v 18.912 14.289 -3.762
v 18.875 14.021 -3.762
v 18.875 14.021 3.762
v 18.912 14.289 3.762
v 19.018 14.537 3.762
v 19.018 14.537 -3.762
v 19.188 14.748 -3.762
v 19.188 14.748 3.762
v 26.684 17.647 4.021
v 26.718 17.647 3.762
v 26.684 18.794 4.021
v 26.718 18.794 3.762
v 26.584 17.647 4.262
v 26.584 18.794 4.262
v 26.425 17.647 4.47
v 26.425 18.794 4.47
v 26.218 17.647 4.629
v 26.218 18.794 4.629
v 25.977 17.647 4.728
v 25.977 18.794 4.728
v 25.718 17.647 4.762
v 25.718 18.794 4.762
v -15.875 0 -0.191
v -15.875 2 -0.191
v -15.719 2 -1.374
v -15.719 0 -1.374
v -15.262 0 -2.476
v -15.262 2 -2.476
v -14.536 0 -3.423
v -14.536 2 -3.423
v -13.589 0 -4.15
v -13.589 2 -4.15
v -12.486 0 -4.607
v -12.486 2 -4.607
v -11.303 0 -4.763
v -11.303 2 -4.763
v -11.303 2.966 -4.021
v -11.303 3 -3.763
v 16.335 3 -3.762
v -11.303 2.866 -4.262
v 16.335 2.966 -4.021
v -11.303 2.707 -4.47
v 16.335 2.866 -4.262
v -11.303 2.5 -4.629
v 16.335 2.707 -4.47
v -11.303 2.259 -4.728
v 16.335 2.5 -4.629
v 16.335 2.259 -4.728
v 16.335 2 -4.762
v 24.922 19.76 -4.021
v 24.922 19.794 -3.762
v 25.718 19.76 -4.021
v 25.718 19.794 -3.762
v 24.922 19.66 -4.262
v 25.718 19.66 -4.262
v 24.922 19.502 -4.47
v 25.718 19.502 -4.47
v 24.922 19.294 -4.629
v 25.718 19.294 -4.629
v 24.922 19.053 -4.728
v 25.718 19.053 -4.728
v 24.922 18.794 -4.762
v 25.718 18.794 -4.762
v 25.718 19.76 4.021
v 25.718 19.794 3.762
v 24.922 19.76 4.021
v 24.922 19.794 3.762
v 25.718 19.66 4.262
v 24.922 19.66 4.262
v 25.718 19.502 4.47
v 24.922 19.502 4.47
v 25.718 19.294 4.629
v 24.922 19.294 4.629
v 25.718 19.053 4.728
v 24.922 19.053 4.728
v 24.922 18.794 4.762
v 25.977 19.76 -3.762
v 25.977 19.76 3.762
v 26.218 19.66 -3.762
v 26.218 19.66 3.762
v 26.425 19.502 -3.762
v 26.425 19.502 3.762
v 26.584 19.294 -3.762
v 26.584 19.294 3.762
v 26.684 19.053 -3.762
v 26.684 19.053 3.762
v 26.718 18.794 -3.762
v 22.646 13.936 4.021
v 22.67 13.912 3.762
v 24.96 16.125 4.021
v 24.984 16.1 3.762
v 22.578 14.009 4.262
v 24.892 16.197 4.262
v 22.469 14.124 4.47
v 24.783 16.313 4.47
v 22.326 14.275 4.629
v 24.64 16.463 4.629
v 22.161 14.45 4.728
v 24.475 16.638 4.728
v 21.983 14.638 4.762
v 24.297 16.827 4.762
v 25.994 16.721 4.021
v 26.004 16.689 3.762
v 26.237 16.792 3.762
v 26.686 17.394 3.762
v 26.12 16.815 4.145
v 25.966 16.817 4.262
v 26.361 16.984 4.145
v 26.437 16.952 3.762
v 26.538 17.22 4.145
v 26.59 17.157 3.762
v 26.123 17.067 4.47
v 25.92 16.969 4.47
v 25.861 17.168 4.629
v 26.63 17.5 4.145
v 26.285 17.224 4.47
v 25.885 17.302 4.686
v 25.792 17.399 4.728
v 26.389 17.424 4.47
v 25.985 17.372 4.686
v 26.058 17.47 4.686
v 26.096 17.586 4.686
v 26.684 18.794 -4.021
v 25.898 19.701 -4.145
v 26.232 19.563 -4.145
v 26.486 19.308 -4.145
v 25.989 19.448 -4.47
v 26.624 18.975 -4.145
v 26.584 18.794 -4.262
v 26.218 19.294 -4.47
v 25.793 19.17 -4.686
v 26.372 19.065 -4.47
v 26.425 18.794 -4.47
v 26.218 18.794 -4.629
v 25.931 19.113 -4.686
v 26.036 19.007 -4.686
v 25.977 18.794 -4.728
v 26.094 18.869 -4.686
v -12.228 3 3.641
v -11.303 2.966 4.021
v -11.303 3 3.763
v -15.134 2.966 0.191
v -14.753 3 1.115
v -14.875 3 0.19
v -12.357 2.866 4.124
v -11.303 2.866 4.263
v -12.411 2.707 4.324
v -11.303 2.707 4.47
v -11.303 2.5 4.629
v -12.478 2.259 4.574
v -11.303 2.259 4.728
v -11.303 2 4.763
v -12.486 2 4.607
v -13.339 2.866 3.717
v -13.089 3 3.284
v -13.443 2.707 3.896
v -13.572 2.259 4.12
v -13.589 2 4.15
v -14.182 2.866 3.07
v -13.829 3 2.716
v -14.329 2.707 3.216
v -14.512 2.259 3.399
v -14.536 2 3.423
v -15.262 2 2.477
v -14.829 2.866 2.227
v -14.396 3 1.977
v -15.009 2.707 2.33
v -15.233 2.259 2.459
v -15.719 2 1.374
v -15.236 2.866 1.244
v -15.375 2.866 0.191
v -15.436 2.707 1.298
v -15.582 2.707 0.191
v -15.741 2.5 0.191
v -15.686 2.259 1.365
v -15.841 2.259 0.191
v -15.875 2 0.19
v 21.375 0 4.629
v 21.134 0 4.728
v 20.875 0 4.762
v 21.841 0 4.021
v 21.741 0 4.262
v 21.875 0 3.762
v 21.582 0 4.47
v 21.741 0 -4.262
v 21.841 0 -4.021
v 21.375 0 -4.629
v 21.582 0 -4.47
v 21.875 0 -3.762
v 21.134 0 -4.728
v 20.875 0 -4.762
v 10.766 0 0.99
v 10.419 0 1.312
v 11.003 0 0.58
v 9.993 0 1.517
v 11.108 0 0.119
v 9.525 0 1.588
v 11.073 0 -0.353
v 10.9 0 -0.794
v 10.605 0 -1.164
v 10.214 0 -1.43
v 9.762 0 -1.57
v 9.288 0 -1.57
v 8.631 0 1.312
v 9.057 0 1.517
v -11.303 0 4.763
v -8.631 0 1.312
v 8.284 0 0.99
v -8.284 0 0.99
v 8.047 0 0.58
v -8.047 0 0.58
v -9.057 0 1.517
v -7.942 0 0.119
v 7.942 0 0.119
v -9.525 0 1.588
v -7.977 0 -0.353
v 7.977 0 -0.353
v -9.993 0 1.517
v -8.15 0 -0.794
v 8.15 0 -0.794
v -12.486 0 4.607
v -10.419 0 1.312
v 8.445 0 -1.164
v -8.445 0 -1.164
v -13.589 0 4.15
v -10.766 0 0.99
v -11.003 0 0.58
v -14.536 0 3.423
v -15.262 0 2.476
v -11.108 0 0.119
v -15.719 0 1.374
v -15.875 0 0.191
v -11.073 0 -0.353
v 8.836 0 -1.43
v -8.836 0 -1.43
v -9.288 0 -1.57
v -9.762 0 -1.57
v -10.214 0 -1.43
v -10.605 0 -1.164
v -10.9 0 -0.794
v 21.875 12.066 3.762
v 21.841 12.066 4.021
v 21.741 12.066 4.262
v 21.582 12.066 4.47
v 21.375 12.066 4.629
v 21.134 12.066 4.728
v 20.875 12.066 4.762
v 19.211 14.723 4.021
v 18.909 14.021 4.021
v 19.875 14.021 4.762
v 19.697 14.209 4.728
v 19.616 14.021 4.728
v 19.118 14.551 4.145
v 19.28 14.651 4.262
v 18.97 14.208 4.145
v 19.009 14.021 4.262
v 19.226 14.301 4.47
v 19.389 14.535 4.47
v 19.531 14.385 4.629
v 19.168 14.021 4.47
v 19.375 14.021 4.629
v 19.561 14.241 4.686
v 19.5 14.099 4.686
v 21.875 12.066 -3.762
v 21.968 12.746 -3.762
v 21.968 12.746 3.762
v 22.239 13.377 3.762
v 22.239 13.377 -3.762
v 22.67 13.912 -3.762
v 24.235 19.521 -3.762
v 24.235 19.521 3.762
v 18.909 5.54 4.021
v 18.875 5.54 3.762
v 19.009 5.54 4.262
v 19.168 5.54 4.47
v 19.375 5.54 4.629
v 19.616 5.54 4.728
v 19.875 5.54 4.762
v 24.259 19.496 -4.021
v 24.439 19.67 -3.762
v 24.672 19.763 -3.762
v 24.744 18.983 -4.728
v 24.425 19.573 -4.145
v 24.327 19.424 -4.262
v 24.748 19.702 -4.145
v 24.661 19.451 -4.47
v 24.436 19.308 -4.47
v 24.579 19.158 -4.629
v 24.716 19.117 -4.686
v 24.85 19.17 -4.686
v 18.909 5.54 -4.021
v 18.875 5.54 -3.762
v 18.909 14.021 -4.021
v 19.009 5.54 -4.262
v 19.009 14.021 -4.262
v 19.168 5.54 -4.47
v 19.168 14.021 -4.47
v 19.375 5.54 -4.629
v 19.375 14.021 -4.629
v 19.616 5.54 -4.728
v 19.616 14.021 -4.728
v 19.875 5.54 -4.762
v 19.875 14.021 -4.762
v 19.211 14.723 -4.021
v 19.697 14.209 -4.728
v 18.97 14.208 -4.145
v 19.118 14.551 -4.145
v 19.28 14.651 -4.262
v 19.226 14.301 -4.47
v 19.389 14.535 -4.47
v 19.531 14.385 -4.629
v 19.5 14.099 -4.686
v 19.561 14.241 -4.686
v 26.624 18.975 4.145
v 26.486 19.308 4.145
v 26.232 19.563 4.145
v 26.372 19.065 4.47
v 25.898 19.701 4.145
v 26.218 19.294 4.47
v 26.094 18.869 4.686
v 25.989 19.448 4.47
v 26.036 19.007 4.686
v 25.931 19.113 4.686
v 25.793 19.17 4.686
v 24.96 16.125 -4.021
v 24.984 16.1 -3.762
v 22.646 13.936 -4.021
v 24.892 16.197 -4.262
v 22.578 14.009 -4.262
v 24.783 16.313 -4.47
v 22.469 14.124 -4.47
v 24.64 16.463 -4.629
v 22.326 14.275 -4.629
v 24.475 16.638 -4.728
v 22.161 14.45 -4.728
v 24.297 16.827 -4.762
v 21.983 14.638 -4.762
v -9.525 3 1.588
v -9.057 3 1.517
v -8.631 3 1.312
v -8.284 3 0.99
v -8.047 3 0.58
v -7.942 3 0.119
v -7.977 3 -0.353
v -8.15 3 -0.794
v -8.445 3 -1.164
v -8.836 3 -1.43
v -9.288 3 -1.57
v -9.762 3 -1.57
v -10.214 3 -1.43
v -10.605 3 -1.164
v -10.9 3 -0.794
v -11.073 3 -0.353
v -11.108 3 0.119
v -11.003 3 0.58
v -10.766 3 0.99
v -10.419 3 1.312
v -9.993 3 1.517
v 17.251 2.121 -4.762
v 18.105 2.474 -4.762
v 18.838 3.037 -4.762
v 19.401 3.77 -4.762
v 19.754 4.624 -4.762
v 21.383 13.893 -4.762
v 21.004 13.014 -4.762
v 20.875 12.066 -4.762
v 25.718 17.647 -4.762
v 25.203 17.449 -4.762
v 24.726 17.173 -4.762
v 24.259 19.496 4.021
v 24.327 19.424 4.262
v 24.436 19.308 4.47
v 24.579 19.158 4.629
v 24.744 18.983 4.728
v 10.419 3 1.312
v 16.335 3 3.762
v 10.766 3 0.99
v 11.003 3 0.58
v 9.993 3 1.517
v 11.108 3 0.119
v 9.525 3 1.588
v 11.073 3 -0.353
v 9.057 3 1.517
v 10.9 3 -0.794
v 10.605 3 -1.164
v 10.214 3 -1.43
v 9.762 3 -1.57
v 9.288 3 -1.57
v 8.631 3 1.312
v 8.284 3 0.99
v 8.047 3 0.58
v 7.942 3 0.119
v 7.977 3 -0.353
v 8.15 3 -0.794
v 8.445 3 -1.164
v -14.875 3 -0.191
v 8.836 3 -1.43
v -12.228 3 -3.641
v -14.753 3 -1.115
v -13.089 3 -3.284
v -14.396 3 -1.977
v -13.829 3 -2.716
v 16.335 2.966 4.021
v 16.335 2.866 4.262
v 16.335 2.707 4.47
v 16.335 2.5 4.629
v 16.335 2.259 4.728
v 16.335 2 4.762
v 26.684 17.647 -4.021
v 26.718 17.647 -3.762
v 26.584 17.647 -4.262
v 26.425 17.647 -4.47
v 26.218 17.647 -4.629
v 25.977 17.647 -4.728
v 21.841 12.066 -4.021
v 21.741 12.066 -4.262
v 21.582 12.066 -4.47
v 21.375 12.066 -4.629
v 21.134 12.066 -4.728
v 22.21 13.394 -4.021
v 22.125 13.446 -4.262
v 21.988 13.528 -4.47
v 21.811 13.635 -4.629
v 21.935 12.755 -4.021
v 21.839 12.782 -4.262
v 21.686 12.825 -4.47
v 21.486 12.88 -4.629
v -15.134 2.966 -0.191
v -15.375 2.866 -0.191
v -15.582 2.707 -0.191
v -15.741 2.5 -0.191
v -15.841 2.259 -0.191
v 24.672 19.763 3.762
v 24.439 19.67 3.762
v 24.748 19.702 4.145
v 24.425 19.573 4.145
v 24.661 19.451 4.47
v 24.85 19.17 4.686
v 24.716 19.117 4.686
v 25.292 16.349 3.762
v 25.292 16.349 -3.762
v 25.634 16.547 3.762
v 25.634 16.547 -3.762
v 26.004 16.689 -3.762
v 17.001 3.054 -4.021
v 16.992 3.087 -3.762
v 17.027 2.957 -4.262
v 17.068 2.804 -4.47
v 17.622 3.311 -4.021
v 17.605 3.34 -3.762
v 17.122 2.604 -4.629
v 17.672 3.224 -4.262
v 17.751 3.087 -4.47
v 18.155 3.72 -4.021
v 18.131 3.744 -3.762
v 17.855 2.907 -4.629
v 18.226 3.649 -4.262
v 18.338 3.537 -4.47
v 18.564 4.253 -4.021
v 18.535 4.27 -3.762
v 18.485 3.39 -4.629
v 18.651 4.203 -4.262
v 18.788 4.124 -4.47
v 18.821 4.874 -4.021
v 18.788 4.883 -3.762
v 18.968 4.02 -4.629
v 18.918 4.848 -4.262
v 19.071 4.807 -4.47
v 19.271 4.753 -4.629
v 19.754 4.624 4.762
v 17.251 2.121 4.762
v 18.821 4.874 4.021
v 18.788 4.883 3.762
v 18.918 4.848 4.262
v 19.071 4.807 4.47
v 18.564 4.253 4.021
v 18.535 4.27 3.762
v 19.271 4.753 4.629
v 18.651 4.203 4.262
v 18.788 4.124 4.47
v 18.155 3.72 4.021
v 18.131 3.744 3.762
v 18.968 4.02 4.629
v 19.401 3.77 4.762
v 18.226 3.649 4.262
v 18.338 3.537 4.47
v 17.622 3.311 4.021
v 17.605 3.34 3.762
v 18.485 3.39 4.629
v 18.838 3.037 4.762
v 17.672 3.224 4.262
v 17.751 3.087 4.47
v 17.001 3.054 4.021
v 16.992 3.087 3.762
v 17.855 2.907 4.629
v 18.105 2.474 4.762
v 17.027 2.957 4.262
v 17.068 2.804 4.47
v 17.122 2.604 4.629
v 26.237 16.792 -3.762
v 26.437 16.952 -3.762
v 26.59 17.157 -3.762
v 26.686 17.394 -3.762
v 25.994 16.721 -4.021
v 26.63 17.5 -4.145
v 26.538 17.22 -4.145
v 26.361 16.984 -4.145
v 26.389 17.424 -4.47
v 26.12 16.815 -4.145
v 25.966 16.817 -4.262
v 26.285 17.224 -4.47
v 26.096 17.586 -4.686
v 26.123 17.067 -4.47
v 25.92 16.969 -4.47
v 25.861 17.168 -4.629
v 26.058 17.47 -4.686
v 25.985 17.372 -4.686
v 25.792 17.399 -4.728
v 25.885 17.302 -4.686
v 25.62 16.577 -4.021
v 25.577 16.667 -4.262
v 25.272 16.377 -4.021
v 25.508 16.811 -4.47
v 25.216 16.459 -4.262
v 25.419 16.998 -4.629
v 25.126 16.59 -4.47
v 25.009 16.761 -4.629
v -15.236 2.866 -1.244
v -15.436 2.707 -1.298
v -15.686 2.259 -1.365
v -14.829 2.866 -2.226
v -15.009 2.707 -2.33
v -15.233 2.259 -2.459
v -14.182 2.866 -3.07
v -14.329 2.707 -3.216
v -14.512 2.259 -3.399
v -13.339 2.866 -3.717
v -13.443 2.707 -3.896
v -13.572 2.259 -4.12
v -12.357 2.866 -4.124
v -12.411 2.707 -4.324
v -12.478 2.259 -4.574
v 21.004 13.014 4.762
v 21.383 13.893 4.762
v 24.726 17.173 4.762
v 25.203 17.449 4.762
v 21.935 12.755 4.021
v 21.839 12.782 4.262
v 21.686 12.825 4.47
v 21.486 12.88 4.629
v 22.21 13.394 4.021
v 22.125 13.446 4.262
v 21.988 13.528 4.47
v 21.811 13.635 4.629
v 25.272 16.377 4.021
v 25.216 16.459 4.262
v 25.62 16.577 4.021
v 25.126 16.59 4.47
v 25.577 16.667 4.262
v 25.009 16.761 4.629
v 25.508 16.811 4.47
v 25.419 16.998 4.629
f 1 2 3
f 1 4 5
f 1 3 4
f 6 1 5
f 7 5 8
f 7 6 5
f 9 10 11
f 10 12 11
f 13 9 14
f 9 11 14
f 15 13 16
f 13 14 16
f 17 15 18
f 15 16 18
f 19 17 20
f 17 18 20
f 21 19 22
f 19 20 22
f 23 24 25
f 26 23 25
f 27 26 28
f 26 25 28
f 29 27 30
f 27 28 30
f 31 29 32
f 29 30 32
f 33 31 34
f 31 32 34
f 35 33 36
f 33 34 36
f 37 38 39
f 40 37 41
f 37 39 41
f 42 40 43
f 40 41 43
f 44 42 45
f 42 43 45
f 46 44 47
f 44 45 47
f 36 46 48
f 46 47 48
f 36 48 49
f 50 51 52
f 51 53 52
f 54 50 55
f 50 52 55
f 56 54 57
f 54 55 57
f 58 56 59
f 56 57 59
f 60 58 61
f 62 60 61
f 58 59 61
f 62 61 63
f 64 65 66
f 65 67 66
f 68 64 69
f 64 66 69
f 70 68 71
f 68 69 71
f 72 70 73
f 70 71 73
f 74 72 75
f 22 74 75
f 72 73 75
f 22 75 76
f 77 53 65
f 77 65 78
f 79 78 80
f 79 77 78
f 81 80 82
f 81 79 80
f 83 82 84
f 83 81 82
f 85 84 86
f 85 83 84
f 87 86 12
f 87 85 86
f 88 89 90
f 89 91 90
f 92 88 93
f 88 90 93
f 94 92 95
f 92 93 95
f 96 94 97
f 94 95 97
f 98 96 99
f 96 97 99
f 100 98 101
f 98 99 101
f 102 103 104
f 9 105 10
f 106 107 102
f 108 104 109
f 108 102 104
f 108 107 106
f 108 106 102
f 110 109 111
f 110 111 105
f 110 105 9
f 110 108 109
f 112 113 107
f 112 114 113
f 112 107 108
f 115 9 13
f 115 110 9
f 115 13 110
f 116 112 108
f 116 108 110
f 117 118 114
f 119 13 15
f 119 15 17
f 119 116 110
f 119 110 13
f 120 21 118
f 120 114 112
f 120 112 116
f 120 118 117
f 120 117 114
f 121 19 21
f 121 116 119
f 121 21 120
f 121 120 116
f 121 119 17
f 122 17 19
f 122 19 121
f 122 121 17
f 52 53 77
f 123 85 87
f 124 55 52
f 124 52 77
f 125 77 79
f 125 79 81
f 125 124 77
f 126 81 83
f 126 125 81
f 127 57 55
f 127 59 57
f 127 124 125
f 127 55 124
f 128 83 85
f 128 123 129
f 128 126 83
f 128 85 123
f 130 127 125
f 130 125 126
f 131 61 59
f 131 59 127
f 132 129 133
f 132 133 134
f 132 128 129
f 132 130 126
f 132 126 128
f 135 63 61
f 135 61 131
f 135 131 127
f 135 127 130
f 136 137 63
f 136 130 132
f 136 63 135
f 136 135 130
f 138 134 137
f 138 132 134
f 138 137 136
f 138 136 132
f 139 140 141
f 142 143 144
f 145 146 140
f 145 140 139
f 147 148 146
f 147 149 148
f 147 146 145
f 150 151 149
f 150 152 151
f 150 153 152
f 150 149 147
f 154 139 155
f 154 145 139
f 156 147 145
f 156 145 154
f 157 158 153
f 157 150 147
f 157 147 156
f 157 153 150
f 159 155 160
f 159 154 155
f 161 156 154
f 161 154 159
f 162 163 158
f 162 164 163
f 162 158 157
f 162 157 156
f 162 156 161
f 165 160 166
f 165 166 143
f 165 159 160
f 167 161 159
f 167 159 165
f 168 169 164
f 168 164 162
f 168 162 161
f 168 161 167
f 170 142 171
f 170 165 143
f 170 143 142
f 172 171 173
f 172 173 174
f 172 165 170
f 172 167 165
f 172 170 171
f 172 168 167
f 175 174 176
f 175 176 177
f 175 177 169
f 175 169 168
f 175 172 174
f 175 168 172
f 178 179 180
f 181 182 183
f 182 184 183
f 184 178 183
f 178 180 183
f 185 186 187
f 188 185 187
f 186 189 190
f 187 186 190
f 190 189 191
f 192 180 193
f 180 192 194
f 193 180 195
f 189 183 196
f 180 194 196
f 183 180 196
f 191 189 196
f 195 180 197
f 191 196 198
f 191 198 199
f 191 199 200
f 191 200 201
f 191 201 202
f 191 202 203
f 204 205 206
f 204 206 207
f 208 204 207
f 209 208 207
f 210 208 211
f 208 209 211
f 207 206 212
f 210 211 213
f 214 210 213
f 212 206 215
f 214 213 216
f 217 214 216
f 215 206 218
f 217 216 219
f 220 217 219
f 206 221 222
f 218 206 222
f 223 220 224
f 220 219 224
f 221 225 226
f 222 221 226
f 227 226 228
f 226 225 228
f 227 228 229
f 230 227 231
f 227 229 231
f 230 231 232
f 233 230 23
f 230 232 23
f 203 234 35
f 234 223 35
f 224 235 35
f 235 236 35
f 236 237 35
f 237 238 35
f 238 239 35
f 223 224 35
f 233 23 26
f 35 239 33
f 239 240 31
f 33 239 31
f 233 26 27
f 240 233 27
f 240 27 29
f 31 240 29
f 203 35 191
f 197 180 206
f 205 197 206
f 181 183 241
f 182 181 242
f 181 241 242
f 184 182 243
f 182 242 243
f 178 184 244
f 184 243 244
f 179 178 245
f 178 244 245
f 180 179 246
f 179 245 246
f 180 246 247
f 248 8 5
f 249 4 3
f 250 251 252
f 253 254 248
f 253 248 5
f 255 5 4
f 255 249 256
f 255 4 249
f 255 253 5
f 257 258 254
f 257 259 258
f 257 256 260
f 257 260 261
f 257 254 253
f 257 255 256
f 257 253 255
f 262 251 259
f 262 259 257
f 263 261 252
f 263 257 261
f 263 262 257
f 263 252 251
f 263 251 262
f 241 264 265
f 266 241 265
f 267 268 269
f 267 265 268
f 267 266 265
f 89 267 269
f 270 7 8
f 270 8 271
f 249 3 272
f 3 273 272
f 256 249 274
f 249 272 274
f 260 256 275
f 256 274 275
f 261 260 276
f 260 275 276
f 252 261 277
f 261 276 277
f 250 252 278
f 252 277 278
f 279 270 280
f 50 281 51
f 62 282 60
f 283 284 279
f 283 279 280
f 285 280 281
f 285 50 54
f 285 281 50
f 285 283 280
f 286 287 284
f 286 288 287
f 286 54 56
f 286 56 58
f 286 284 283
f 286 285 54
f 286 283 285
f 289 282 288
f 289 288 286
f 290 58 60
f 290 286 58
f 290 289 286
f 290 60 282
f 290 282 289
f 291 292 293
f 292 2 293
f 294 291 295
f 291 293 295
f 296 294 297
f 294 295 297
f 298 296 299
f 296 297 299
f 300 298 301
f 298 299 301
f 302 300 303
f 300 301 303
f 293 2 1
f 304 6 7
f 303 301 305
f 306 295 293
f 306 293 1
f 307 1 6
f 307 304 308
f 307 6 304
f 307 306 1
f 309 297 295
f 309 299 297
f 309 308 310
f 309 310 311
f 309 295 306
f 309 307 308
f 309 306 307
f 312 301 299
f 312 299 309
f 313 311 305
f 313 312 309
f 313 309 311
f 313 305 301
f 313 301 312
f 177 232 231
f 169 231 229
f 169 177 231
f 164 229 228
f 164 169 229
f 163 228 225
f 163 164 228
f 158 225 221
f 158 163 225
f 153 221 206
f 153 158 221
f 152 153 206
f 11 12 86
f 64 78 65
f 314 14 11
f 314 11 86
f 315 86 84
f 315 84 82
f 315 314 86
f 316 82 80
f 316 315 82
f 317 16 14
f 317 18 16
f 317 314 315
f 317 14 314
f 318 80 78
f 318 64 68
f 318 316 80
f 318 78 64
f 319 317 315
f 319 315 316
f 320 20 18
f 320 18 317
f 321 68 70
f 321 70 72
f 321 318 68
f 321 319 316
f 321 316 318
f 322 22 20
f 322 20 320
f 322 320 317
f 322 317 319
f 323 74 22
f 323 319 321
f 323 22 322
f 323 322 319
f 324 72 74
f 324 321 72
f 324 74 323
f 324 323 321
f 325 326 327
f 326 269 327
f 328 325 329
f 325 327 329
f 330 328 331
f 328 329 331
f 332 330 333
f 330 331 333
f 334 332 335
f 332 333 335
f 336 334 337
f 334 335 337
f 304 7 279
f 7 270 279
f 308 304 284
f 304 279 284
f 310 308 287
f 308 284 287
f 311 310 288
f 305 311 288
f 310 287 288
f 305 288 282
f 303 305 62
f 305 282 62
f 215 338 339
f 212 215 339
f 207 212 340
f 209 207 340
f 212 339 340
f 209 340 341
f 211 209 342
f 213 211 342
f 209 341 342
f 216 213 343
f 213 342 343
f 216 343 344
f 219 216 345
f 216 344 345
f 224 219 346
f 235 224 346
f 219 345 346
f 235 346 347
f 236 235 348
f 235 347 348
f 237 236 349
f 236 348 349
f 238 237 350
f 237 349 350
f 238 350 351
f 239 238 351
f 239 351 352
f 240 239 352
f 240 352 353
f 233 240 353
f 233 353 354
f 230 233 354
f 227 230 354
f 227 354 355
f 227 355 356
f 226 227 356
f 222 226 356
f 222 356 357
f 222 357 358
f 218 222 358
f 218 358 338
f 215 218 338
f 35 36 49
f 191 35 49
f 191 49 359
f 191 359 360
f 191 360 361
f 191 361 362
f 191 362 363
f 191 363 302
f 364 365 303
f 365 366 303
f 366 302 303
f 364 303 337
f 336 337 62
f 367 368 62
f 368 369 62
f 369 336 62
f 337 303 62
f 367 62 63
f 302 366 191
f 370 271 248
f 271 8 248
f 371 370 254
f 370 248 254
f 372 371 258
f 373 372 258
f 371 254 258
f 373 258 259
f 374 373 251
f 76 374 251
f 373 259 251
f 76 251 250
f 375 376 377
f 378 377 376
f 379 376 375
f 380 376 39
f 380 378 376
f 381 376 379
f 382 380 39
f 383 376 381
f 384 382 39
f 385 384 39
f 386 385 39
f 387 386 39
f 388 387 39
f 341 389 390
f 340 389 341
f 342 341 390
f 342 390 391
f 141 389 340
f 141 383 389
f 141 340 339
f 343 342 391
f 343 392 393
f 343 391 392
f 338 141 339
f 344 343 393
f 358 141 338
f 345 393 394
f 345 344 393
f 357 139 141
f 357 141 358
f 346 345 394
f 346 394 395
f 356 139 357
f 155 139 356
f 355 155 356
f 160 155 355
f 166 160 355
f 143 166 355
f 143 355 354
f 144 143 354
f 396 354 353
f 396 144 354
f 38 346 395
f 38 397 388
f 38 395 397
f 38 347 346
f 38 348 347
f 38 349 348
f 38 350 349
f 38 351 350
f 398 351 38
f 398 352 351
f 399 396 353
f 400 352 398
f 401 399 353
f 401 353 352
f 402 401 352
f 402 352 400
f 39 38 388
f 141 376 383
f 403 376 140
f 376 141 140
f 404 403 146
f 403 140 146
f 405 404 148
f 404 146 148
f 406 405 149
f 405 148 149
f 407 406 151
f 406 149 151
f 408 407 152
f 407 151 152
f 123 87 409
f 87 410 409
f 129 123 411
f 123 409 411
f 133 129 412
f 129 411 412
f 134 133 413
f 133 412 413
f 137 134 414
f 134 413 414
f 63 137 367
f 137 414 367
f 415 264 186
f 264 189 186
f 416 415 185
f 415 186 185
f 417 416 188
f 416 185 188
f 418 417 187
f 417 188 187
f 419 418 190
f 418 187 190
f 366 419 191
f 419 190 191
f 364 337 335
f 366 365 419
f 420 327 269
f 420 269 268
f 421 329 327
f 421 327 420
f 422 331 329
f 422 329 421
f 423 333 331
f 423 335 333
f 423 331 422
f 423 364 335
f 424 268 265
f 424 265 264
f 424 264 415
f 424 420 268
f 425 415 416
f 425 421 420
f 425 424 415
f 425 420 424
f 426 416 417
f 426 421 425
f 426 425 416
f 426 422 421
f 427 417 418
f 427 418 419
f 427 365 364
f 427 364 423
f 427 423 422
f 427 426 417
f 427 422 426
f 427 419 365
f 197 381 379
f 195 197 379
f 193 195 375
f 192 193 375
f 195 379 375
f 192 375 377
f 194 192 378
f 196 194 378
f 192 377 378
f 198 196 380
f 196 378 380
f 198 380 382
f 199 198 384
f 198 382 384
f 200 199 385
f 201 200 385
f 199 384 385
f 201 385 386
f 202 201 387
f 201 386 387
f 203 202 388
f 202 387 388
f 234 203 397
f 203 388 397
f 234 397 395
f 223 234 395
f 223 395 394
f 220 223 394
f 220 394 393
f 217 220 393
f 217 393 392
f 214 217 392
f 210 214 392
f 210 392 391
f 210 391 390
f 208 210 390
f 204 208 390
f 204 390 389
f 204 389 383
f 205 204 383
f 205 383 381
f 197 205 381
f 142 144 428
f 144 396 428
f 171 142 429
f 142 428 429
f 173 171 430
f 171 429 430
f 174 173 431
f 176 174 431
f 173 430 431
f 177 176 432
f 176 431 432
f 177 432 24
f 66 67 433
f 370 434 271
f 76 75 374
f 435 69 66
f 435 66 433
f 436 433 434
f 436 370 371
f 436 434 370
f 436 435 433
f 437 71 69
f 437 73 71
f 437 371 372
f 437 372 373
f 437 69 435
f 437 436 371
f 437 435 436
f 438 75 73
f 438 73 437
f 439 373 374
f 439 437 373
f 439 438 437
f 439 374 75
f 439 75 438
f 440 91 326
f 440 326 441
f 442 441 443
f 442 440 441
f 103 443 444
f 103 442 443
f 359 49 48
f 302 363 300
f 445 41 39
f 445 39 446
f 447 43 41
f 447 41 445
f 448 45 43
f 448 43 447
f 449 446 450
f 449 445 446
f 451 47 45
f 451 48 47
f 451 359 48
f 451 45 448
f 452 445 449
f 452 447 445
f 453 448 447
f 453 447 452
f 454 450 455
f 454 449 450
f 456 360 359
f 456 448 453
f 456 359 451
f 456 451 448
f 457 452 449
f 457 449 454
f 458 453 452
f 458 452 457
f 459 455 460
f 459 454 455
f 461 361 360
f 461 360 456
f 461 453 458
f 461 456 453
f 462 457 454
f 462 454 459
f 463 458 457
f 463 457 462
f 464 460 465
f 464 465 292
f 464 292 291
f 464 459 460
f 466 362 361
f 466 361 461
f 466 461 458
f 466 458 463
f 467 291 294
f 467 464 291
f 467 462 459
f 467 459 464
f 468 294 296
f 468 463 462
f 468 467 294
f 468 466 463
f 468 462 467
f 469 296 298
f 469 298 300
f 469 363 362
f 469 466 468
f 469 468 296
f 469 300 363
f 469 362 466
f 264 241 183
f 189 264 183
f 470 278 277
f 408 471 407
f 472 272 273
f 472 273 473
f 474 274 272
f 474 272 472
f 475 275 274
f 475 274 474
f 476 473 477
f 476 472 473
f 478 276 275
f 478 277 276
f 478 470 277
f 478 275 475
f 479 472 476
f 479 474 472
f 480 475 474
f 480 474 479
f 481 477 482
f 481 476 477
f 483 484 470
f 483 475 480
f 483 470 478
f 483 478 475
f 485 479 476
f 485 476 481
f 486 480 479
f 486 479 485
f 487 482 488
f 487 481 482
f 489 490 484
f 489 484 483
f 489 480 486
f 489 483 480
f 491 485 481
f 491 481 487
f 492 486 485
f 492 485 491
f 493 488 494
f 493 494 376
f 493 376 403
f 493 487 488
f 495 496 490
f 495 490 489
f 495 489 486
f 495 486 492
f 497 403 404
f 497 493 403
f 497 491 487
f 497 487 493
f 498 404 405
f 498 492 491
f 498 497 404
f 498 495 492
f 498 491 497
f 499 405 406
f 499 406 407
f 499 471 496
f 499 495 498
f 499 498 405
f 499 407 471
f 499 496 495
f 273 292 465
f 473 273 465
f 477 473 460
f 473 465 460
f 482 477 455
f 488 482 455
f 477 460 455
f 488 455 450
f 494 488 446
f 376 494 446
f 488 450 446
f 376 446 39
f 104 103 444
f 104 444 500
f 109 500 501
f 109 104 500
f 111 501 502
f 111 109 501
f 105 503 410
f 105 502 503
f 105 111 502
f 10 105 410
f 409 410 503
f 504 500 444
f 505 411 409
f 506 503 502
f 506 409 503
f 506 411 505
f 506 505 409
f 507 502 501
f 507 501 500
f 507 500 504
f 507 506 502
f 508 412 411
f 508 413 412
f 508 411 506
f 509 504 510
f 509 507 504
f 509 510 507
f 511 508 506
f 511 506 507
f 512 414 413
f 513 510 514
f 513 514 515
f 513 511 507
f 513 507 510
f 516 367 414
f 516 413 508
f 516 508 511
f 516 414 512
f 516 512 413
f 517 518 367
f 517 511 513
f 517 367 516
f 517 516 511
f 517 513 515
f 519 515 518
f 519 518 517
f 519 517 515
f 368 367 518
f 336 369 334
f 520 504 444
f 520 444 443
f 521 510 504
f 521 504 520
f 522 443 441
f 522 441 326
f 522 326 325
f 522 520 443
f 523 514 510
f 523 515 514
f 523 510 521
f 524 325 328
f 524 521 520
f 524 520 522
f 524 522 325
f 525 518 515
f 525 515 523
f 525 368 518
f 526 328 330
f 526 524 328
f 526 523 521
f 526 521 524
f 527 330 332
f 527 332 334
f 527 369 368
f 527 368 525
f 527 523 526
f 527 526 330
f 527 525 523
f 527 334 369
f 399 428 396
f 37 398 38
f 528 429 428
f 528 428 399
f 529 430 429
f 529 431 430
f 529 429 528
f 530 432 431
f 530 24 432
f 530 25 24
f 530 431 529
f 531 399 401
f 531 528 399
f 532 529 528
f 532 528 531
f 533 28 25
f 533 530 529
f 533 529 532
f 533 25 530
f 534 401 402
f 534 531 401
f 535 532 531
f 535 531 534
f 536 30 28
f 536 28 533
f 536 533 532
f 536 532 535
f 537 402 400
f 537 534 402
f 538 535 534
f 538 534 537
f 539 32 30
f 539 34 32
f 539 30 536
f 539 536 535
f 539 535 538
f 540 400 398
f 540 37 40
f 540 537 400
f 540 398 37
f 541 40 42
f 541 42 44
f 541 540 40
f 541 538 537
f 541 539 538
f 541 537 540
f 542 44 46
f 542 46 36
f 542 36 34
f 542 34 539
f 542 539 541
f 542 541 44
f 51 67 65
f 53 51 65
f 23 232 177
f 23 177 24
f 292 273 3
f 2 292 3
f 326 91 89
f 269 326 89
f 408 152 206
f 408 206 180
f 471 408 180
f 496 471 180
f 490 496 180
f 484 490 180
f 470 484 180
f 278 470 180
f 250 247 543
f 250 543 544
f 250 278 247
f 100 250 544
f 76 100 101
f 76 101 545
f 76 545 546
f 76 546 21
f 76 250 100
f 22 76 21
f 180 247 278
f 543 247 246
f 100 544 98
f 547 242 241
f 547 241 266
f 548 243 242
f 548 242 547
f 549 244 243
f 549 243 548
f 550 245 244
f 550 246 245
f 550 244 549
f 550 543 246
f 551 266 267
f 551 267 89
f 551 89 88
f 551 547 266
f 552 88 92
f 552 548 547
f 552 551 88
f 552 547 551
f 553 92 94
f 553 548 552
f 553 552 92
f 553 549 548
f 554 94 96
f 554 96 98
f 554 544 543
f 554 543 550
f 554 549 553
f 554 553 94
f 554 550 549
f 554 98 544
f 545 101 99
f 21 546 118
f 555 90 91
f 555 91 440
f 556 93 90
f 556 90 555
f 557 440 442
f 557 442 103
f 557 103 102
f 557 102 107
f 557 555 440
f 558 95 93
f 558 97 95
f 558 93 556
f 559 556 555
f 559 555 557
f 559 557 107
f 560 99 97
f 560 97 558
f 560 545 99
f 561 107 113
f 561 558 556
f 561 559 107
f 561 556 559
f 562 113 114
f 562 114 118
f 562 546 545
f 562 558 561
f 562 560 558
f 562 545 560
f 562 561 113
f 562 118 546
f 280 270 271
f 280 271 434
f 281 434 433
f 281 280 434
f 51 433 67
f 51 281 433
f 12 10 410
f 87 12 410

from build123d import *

# Parameters (mm, degrees)
SKETCH1_W           = 31.75
SKETCH1_H           = 9.525
BOSS_EXTRUDE1_DEPTH = 3
SKETCH2_R           = 1.5875
CUT_EXTRUDE1_DEPTH  = 17.843308204
FILLET1_R           = 4.572
SKETCH3_W           = 9.525
SKETCH3_H           = 3
BOSS_EXTRUDE2_DEPTH = 6
BOSS_EXTRUDE3_DEPTH = 9.525
FILLET3_R           = 2.54
FILLET4_R           = 1
FILLET5_R           = 2.54
FILLET7_R           = 1


with BuildPart() as part:
    # Sketch1 → Boss-Extrude1 (new body)
    with BuildSketch(Plane(origin=(0, 0, 0), x_dir=(1, 0, 0), z_dir=(0, 1, 0))):
        Rectangle(SKETCH1_W, SKETCH1_H)
    extrude(amount=BOSS_EXTRUDE1_DEPTH)

    # Sketch2 → Cut-Extrude1 (cut, through all)
    with BuildSketch(Plane(origin=(0, 3, 0), x_dir=(1, 0, 0), z_dir=(0, 1, 0))):
        with Locations(Location((-9.525, 0, 0), (0, 0, 270))):
            Circle(SKETCH2_R)
        with Locations(Location((9.525, 0, 0), (0, 0, 270))):
            Circle(SKETCH2_R)
    extrude(amount=-CUT_EXTRUDE1_DEPTH, mode=Mode.SUBTRACT)

    # Fillet1
    fillet1_edges = [part.edges().sort_by_distance(p)[0] for p in [
        (-15.875, 1.5, 4.7625),
        (-15.875, 1.5, -4.7625),
    ]]
    fillet(fillet1_edges, radius=FILLET1_R)

    # Sketch3 → Boss-Extrude2 (add)
    with BuildSketch(Plane(origin=(15.875, 0, 0), x_dir=(0, 0, -1), z_dir=(1, 0, 0))):
        with Locations((0, 1.5)):
            Rectangle(SKETCH3_W, SKETCH3_H)
    extrude(amount=BOSS_EXTRUDE2_DEPTH)

    # Sketch5 → Boss-Extrude3 (add)
    with BuildSketch(Plane.XY.offset(4.7625)):
        Polygon((18.875, 3), (18.875, 14.451976797), (24.524350343, 19.794466274), (26.718222037, 19.794466274), (26.718222037, 16.794466274), (25.718222037, 16.794466274), (21.875, 13.16), (21.875, 3), align=None)
    extrude(amount=-BOSS_EXTRUDE3_DEPTH)

    # Fillet3
    # the kernel refuses this fillet: 2.54 mm, written as the material it adds along each edge
    with BuildSketch(Plane(origin=(21.875, 13.16, 4.7625), x_dir=(0, -1, 0), z_dir=(0, 0, -1))) as fillet3_piece_1:
        with BuildLine():
            CenterArc((FILLET3_R * 0.430658932297, -FILLET3_R), FILLET3_R, 90, 46.599119654)
            Line((-FILLET3_R * 0.295905181539, -FILLET3_R * 0.312901325509), (0, 0))
            Line((0, 0), (FILLET3_R * 0.430658932297, 0))
        make_face()
    extrude(amount=9.525)
    with BuildSketch(Plane(origin=(25.718222037, 16.794466274, 4.7625), x_dir=(-0.7265641138352414, -0.6870986744906513, 0), z_dir=(0, 0, -1))) as fillet3_piece_2_section:
        with BuildLine():
            CenterArc((FILLET3_R * 0.39795723135, -FILLET3_R), FILLET3_R, 90, 43.400880346)
            Line((-FILLET3_R * 0.28914144314, -FILLET3_R * 0.273435886165), (0, 0))
            Line((0, 0), (FILLET3_R * 0.39795723135, 0))
        make_face()
    fillet3_piece_2 = extrude(amount=9.525, mode=Mode.PRIVATE)
    fillet3_piece_2 = split(fillet3_piece_2, bisect_by=Plane(origin=(26.718222037, 16.648240502, 0), z_dir=(-1, 0, 0)), keep=Keep.TOP, mode=Mode.PRIVATE)
    add(fillet3_piece_2)

    # Fillet4
    fillet4_edges = [part.edges().sort_by_distance(p)[0] for p in [
        (18.875, 14.451976797, 0),
        (24.524350343, 19.794466274, 0),
        (26.718222037, 19.794466274, 0),
        (26.718222037, 16.794443265, 0),
    ]]
    fillet(fillet4_edges, radius=FILLET4_R)

    # Fillet5
    fillet5_edges = [part.edges().sort_by_distance(p)[0] for p in [
        (18.875, 3, 0),
    ]]
    fillet(fillet5_edges, radius=FILLET5_R)

    # Fillet7
    fillet7_edges = [part.edges().sort_by_distance(p)[0] for p in [
        (18.875, 9.780658932, -4.7625),
        (2.516, 3, -4.7625),
        (18.131051224, 3.743948776, 4.7625),
        (18.131051224, 3.743948776, -4.7625),
        (2.516, 3, 4.7625),
        (-15.875, 3, 0),
        (-14.535892204, 3, -3.423392204),
        (-14.535892204, 3, 3.423392204),
        (21.875, 6.033063156, -4.7625),
        (21.875, 6.033063156, 4.7625),
        (23.826786069, 15.005769142, -4.7625),
        (23.826786069, 15.005769142, 4.7625),
        (22.082138473, 13.070793966, 4.7625),
        (22.082138473, 13.070793966, -4.7625),
        (25.459186859, 16.454259389, 4.7625),
        (21.711555113, 17.134456183, -4.7625),
        (21.711555113, 17.134456183, 4.7625),
        (26.718222037, 18.220775531, 4.7625),
        (25.320264806, 19.794466274, 4.7625),
        (18.875, 9.780658932, 4.7625),
        (26.519951397, 17.049397551, 4.7625),
        (26.425328818, 19.501573055, 4.7625),
        (24.552553679, 19.723596005, 4.7625),
        (18.95655058, 14.416856311, 4.7625),
        (25.320264806, 19.794466274, -4.7625),
        (26.718222037, 18.220775531, -4.7625),
        (25.459186859, 16.454259389, -4.7625),
        (26.519951397, 17.049397551, -4.7625),
        (26.425328818, 19.501573055, -4.7625),
        (24.552553679, 19.723596005, -4.7625),
        (18.95655058, 14.416856311, -4.7625),
    ]]
    fillet(fillet7_edges, radius=FILLET7_R)


solid = part.part
